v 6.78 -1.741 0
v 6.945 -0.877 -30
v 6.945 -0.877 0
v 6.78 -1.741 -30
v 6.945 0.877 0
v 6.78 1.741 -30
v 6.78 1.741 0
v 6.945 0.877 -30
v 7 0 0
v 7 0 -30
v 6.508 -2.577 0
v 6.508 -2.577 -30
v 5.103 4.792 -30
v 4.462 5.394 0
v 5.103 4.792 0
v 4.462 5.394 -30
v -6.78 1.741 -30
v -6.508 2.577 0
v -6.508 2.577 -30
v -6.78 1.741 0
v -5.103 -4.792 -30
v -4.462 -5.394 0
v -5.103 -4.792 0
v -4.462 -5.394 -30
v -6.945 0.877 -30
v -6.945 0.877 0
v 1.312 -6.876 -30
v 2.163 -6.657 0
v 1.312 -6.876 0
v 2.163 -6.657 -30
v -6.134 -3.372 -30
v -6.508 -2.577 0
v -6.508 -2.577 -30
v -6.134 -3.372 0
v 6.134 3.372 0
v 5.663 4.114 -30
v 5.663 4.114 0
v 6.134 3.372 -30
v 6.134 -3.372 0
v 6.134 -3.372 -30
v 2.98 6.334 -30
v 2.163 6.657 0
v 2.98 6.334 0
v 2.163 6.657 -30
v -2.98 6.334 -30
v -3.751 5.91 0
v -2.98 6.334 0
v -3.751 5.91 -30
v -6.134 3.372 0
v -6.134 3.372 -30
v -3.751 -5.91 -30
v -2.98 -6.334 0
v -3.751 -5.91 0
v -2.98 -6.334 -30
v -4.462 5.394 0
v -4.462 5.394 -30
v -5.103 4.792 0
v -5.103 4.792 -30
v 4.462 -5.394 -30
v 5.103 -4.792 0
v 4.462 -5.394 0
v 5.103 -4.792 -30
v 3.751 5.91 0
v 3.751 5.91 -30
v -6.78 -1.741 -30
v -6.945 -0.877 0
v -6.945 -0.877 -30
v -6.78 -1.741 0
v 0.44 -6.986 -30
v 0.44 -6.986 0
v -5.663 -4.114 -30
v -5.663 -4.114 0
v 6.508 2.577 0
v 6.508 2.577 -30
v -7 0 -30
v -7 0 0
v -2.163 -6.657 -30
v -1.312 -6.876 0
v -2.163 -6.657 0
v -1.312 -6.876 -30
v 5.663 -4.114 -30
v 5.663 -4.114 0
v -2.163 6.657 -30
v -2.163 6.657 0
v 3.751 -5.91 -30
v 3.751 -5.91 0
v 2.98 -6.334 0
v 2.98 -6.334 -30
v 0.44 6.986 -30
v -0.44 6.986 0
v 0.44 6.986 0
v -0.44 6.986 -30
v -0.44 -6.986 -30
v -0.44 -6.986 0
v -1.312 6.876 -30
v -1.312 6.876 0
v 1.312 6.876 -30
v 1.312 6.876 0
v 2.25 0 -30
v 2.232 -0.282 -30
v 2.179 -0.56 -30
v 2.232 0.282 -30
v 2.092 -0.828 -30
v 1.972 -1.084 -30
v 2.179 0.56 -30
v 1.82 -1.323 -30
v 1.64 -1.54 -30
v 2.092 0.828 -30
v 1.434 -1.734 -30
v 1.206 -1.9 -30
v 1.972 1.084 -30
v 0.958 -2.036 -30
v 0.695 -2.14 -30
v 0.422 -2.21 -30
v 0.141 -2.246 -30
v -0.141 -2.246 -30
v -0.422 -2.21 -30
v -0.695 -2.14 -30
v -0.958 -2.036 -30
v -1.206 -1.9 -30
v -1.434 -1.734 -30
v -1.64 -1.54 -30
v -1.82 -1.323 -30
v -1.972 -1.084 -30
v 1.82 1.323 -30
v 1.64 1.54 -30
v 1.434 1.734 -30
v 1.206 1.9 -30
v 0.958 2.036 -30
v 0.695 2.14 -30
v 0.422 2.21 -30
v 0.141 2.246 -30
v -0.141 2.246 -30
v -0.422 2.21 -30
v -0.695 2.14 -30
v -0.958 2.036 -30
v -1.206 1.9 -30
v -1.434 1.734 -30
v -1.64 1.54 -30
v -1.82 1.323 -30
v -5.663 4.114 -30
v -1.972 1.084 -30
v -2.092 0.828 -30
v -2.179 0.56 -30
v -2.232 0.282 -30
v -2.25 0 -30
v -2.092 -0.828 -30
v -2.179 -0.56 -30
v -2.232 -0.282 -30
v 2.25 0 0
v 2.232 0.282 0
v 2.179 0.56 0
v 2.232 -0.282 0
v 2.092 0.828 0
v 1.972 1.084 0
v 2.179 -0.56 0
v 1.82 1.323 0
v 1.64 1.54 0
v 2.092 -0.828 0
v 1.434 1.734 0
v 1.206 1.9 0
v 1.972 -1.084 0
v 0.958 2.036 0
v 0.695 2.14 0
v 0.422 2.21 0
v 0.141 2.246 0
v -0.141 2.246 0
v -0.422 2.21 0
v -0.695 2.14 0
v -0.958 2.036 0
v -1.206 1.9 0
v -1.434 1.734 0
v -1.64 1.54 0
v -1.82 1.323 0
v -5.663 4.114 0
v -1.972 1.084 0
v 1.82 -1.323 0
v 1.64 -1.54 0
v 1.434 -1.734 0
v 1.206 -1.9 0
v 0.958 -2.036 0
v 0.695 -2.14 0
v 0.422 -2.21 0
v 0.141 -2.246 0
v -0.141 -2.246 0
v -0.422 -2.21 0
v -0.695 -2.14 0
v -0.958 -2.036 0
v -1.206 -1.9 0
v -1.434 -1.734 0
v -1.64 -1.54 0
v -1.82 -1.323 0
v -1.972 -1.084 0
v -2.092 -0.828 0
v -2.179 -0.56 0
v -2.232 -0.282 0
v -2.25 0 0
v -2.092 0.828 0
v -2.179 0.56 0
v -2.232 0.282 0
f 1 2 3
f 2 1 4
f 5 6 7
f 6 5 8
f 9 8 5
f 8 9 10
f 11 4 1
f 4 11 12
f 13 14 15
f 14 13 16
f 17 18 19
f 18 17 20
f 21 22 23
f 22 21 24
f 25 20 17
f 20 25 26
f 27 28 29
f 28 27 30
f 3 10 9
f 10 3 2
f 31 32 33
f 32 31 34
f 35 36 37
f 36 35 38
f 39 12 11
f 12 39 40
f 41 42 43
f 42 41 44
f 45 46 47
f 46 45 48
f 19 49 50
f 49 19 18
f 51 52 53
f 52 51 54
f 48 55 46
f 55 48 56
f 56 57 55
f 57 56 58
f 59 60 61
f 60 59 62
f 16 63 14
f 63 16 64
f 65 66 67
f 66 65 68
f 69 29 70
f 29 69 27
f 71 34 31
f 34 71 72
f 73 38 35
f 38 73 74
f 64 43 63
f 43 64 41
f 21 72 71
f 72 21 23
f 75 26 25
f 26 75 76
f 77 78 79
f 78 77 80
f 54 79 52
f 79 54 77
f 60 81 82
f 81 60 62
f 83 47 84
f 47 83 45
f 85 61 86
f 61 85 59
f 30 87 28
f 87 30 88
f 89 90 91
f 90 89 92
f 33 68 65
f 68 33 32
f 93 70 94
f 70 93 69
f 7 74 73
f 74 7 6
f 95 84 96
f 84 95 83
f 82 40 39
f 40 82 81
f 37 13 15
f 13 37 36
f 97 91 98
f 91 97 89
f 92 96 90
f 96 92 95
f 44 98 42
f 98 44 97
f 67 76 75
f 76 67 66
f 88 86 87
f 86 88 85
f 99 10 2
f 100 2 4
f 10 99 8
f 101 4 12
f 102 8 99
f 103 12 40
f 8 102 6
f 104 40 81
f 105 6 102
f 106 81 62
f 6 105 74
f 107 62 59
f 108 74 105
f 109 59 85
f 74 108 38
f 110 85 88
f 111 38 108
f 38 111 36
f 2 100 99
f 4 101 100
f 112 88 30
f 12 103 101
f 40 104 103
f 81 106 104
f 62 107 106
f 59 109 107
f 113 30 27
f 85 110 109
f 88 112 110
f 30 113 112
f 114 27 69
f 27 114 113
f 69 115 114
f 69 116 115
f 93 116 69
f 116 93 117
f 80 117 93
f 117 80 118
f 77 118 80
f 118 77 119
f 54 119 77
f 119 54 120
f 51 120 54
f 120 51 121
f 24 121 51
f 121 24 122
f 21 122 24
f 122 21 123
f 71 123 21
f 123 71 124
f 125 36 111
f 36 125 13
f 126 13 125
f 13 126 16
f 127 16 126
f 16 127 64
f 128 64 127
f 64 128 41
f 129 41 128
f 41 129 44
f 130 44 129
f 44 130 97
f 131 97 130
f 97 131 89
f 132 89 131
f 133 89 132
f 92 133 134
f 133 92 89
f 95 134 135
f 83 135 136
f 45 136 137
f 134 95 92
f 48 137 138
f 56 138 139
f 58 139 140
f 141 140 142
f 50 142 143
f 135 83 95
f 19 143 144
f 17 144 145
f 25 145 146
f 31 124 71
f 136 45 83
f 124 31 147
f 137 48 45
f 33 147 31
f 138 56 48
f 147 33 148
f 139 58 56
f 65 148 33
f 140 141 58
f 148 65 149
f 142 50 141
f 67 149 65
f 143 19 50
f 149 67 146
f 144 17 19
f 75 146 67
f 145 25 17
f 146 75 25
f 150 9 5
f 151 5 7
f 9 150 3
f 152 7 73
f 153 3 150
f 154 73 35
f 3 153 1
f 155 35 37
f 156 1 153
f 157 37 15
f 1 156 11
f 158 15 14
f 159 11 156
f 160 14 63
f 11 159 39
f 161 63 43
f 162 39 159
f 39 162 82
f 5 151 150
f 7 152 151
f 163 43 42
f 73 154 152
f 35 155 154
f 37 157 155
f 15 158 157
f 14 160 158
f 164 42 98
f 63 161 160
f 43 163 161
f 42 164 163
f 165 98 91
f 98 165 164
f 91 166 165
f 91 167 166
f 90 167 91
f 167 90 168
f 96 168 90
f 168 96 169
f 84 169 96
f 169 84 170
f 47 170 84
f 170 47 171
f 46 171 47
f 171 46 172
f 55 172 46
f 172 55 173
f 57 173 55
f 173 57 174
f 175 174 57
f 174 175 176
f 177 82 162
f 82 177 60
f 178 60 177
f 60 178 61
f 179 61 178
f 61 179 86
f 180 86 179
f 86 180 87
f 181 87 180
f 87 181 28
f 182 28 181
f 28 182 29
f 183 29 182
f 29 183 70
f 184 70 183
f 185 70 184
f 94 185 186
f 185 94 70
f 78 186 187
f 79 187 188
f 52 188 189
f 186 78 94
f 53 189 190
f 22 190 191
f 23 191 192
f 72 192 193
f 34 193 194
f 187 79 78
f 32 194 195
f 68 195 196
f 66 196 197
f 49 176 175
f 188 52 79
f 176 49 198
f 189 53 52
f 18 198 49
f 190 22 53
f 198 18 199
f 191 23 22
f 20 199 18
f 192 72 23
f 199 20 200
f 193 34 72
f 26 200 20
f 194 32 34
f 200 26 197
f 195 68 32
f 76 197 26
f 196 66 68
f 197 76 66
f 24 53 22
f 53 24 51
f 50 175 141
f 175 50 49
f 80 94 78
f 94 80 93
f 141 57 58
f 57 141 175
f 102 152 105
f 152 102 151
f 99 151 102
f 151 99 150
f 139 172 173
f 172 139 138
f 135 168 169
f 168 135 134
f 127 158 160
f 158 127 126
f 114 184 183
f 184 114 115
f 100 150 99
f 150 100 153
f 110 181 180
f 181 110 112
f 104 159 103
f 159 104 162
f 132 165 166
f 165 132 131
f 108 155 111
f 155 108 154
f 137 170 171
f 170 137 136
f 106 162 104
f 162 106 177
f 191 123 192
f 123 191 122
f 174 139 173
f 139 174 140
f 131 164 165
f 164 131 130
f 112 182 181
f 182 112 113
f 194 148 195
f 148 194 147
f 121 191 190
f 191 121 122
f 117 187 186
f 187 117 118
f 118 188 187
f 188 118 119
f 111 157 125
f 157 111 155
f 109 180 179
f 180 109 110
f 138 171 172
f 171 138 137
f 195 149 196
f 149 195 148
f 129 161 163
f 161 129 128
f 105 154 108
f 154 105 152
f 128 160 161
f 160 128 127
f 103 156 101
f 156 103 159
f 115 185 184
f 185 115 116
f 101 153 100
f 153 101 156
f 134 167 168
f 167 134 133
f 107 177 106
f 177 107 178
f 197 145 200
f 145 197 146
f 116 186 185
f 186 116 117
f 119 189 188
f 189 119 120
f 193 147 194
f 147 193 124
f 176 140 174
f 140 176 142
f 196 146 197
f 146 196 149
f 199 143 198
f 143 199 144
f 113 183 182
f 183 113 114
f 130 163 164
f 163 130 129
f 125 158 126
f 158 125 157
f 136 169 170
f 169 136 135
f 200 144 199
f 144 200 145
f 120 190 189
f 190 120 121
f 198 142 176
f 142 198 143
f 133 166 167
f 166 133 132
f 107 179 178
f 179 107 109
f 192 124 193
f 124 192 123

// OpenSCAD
$fn = 50;


difference() {
	union() {
		translate(v = [0, 0, -30.0000000000]) {
			cylinder(h = 30, r = 7.0000000000);
		}
		cylinder(h = 0, r = 17.0000000000);
	}
	union() {
		#translate(v = [0, 0, -30]) {
			cylinder(h = 30, r = 2.2500000000);
		}
	}
}
